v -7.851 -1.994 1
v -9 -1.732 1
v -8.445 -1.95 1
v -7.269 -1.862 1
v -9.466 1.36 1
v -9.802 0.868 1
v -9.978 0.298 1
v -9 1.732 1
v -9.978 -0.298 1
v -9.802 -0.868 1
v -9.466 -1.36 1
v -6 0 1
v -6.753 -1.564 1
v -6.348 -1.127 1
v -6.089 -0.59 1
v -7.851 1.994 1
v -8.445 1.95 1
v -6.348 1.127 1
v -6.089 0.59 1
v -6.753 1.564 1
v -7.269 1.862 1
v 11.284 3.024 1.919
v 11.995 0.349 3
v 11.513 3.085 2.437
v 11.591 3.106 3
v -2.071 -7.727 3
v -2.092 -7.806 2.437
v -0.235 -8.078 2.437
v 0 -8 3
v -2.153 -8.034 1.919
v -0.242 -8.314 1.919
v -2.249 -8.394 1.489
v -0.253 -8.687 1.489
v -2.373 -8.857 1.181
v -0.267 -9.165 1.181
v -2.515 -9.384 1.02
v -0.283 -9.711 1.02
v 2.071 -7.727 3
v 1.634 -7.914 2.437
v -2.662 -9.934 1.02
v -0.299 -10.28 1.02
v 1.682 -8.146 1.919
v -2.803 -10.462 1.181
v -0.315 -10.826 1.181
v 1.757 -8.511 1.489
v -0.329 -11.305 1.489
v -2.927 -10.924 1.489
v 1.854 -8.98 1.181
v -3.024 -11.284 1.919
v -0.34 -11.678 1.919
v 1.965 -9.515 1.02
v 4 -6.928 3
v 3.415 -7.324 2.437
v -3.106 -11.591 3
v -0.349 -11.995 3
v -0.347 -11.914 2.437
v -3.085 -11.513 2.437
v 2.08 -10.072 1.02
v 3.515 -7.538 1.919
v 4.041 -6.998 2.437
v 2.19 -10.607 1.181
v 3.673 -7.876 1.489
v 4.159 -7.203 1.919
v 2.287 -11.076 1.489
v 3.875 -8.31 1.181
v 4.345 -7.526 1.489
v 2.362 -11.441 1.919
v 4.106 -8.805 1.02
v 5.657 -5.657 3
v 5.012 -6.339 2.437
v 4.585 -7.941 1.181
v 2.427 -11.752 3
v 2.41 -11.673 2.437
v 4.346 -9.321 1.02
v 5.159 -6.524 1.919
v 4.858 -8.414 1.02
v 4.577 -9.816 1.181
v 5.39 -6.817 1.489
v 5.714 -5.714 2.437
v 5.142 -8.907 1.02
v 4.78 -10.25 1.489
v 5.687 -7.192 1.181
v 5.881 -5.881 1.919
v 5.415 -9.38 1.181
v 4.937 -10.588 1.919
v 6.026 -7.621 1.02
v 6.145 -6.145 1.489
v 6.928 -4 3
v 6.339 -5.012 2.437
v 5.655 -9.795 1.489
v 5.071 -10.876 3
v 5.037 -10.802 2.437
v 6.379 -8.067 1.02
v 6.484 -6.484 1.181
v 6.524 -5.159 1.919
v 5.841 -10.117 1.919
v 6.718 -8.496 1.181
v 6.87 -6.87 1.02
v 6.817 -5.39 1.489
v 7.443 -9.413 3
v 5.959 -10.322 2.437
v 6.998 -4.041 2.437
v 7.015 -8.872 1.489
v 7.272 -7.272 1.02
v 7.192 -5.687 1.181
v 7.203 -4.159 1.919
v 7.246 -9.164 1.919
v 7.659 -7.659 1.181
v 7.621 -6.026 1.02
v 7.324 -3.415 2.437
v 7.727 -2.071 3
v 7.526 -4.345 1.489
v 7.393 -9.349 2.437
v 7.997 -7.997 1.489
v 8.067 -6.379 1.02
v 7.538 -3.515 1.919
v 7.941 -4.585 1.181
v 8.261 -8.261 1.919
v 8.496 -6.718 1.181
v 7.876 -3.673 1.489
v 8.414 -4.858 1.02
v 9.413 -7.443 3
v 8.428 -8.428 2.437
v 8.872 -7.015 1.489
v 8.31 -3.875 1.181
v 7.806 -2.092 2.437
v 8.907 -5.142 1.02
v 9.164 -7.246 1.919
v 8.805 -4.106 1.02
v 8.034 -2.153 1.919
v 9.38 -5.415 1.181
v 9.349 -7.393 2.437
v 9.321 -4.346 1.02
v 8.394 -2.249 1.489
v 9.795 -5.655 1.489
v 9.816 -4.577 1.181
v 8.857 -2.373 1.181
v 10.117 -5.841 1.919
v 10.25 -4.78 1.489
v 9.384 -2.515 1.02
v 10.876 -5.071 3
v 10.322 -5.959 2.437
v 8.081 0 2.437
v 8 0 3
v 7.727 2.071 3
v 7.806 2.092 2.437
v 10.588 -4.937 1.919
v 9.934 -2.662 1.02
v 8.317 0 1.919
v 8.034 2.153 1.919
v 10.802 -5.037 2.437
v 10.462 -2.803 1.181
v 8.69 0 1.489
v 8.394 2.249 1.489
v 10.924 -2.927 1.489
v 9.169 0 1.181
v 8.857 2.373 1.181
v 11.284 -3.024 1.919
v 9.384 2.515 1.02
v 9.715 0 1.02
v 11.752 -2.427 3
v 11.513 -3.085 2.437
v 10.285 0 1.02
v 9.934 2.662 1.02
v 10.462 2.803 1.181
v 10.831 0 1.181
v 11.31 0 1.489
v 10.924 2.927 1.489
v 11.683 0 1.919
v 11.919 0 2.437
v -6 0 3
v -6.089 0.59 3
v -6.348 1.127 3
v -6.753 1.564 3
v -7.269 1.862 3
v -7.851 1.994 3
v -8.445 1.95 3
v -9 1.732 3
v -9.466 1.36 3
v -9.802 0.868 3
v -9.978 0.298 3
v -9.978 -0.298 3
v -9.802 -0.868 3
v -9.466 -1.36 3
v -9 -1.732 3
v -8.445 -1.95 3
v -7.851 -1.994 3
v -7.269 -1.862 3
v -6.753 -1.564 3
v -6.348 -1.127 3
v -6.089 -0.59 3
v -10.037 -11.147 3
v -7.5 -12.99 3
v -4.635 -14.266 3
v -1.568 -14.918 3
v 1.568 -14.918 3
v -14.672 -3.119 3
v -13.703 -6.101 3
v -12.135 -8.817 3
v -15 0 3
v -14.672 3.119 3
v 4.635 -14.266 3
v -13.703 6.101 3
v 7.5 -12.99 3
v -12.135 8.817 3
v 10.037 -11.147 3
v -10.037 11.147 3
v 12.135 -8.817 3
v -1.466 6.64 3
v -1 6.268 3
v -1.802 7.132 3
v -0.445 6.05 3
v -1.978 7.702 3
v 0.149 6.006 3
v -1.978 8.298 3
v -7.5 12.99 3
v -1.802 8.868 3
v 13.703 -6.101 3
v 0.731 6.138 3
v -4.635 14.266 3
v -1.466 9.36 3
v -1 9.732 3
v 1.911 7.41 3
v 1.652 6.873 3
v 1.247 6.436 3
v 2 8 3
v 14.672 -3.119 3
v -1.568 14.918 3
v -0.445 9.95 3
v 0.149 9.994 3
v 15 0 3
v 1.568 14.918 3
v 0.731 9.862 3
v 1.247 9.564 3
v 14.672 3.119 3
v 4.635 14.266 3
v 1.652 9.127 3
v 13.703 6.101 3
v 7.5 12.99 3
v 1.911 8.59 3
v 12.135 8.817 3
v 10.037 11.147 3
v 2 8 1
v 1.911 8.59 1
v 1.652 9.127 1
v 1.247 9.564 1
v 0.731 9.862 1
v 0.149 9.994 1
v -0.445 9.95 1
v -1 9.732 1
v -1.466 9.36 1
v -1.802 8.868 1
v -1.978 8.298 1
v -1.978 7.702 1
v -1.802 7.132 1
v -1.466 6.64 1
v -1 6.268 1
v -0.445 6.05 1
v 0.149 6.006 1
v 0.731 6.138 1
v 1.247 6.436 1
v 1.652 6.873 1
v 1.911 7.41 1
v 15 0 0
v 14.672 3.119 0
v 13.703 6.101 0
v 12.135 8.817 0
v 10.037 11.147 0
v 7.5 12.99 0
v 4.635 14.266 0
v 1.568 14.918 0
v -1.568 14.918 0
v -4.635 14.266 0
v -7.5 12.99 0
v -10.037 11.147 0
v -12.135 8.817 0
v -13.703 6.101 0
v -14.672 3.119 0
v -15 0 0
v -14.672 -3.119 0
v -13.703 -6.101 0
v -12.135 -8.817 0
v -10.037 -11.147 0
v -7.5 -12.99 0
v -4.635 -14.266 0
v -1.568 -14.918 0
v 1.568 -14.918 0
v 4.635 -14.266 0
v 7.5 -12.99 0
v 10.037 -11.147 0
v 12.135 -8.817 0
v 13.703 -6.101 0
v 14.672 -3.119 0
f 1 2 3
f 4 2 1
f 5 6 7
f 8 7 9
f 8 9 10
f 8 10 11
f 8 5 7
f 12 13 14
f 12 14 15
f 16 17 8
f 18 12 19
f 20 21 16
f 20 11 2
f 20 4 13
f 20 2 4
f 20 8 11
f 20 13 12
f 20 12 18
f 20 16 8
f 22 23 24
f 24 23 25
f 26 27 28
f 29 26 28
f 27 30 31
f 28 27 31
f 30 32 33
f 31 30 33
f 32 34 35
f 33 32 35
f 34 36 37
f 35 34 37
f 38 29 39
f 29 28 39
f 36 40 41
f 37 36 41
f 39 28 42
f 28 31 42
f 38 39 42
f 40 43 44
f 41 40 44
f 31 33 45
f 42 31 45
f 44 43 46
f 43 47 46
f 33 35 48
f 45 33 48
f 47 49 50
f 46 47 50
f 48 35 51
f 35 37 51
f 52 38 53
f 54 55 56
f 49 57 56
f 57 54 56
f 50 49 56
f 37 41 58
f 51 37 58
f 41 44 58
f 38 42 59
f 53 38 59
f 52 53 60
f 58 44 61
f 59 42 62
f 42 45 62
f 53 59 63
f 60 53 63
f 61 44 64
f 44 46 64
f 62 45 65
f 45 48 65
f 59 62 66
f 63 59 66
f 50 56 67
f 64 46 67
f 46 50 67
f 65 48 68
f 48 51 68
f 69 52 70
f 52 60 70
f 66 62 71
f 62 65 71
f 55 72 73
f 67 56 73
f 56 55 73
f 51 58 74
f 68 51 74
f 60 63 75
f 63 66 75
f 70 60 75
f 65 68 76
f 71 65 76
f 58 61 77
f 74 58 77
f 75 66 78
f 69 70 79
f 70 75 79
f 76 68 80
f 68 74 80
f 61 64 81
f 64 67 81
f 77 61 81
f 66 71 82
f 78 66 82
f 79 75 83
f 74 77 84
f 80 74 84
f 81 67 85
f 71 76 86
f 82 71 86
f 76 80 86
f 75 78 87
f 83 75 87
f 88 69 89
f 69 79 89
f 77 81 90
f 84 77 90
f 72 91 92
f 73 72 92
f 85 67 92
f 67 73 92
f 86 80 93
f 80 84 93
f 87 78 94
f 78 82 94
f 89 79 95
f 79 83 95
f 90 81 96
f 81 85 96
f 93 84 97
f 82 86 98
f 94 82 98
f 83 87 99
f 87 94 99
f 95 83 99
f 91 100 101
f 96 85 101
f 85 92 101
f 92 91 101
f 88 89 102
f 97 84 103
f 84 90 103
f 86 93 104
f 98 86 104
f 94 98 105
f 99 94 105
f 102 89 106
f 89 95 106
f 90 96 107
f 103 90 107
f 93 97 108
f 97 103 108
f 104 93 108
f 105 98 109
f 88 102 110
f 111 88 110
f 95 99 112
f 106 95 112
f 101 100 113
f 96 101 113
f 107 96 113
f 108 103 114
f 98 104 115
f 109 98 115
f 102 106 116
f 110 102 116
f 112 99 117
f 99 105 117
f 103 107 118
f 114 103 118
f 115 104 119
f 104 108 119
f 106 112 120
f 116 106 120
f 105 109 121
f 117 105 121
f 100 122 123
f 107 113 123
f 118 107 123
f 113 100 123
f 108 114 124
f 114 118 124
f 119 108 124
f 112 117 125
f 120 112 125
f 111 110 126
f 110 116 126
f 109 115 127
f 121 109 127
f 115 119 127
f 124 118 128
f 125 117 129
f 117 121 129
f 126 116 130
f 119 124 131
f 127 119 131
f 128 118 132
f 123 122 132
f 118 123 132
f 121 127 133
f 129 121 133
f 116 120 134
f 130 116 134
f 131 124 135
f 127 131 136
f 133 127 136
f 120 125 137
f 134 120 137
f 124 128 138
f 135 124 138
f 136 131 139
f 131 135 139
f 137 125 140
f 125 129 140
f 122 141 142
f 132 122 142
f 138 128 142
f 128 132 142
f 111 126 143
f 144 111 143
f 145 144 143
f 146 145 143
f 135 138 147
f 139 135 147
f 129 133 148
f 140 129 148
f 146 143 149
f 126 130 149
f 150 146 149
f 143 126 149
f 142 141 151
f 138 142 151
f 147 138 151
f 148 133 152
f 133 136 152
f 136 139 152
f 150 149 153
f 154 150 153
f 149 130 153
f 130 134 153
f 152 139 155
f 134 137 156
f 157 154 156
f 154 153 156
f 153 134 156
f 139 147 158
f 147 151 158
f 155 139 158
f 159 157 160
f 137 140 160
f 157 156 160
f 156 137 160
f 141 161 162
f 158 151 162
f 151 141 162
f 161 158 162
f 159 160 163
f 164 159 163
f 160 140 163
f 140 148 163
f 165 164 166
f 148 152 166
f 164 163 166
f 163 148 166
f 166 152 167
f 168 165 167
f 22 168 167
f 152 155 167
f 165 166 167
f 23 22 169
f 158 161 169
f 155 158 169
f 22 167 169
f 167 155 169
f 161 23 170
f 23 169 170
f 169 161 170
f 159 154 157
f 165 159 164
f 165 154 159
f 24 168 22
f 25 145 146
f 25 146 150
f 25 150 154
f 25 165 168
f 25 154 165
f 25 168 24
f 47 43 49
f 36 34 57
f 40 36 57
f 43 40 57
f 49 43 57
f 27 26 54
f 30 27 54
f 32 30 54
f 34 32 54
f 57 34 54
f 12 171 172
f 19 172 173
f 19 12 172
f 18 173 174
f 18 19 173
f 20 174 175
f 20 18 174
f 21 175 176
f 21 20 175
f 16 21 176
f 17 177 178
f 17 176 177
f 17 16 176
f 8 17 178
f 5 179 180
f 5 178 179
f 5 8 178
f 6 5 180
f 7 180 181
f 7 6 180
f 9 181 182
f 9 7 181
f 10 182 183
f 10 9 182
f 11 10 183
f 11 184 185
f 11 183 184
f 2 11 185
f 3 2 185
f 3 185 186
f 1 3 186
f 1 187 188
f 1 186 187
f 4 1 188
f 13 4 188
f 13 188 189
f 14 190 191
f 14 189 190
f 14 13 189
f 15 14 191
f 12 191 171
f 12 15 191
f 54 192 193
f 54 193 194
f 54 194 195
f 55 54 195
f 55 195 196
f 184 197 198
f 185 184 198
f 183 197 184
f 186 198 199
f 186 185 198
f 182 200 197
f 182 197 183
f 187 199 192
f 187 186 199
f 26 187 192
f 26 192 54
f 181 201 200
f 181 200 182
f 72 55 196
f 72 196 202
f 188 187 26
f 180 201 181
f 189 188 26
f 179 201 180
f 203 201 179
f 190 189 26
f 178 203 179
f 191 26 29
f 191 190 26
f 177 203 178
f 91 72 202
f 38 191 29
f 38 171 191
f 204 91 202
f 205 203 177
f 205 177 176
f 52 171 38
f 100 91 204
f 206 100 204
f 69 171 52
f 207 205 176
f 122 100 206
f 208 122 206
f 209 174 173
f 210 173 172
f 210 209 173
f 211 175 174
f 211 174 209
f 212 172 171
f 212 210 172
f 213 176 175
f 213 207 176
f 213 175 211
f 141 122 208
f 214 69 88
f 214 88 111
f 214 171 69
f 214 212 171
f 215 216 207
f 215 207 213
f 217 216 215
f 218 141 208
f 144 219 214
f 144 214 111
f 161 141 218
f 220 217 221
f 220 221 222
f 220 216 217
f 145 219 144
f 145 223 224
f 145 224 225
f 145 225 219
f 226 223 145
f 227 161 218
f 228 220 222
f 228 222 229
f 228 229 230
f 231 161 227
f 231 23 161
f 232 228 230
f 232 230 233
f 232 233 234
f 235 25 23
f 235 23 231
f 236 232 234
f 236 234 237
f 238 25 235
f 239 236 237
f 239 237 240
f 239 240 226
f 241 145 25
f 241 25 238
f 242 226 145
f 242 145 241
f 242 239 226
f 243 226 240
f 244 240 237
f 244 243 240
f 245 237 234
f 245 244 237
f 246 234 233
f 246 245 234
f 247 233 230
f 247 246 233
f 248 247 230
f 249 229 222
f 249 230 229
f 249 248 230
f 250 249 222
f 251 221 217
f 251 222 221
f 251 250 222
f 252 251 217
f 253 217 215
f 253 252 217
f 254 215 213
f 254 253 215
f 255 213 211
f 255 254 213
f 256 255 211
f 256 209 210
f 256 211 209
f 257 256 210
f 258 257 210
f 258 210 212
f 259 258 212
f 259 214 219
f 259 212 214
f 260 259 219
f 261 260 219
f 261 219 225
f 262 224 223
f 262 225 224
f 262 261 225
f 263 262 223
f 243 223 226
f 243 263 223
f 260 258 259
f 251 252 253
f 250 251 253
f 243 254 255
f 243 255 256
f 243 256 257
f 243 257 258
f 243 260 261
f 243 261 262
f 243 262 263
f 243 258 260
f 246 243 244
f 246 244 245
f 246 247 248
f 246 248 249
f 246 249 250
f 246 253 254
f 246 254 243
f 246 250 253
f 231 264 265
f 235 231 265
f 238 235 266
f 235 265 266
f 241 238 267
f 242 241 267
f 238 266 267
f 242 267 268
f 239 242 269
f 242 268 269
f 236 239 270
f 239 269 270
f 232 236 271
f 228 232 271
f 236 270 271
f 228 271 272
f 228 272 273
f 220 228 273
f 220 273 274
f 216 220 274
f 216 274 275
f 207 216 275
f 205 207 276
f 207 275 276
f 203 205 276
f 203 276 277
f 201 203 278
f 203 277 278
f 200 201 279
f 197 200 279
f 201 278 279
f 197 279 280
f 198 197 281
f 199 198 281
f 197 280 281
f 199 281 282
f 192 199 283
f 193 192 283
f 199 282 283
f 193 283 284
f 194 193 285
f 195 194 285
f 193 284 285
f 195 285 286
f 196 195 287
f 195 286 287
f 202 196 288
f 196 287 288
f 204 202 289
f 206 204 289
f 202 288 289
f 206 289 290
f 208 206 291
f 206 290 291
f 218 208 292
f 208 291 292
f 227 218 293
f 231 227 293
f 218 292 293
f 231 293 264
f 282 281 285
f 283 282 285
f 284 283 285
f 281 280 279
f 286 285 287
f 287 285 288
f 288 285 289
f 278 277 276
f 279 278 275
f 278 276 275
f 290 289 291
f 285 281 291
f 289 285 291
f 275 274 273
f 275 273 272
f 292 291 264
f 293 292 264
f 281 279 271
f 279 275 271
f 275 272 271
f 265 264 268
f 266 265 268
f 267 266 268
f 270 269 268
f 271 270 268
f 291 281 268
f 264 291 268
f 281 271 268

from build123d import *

# Parameters (mm, degrees)
CYLINDER001_R         = 2
CYLINDER001_DEPTH     = 10
CYLINDER002_R         = 2
CYLINDER002_DEPTH     = 10
TORUS_R               = 2
TORUS_ANGLE           = 120
TORUS_PLACEMENT_ANGLE = 255
CYLINDER_R            = 15
CYLINDER_DEPTH        = 3


with BuildPart() as cilindro001:
    # Cylinder001 → Cylinder001 (new body)
    with BuildSketch(Plane(origin=(0, 8, 1), x_dir=(1, 0, 0), z_dir=(0, 0, 1))):
        Circle(CYLINDER001_R)
    extrude(amount=CYLINDER001_DEPTH)


with BuildPart() as fusion:
    # Cylinder002 → Cylinder002 (new body)
    with BuildSketch(Plane(origin=(-8, 0, 1), x_dir=(1, 0, 0), z_dir=(0, 0, 1))):
        Circle(CYLINDER002_R)
    extrude(amount=CYLINDER002_DEPTH)

    # Fusion: union Cilindro001
    add(cilindro001.part)


with BuildPart() as toro:
    # Torus → Torus (revolve)
    with BuildSketch(Plane.XZ):
        with Locations((10, 0)):
            Circle(TORUS_R)
    revolve(axis=Axis((0, 0, 0), (0, 0, 1)), revolution_arc=TORUS_ANGLE)


with BuildPart() as toro_1:
    # Torus placement: moved
    add(toro.part.moved(Location((0, 0, 3))).rotate(Axis((0, 0, 3), (0, 0, 1)), TORUS_PLACEMENT_ANGLE))


with BuildPart() as cut001:
    # Cylinder → Cylinder (new body)
    with BuildSketch(Plane.XY):
        Circle(CYLINDER_R)
    extrude(amount=CYLINDER_DEPTH)

    # Cut: cut Toro
    add(toro_1.part, mode=Mode.SUBTRACT)

    # Cut001: cut Fusion
    add(fusion.part, mode=Mode.SUBTRACT)


solid = cut001.part
